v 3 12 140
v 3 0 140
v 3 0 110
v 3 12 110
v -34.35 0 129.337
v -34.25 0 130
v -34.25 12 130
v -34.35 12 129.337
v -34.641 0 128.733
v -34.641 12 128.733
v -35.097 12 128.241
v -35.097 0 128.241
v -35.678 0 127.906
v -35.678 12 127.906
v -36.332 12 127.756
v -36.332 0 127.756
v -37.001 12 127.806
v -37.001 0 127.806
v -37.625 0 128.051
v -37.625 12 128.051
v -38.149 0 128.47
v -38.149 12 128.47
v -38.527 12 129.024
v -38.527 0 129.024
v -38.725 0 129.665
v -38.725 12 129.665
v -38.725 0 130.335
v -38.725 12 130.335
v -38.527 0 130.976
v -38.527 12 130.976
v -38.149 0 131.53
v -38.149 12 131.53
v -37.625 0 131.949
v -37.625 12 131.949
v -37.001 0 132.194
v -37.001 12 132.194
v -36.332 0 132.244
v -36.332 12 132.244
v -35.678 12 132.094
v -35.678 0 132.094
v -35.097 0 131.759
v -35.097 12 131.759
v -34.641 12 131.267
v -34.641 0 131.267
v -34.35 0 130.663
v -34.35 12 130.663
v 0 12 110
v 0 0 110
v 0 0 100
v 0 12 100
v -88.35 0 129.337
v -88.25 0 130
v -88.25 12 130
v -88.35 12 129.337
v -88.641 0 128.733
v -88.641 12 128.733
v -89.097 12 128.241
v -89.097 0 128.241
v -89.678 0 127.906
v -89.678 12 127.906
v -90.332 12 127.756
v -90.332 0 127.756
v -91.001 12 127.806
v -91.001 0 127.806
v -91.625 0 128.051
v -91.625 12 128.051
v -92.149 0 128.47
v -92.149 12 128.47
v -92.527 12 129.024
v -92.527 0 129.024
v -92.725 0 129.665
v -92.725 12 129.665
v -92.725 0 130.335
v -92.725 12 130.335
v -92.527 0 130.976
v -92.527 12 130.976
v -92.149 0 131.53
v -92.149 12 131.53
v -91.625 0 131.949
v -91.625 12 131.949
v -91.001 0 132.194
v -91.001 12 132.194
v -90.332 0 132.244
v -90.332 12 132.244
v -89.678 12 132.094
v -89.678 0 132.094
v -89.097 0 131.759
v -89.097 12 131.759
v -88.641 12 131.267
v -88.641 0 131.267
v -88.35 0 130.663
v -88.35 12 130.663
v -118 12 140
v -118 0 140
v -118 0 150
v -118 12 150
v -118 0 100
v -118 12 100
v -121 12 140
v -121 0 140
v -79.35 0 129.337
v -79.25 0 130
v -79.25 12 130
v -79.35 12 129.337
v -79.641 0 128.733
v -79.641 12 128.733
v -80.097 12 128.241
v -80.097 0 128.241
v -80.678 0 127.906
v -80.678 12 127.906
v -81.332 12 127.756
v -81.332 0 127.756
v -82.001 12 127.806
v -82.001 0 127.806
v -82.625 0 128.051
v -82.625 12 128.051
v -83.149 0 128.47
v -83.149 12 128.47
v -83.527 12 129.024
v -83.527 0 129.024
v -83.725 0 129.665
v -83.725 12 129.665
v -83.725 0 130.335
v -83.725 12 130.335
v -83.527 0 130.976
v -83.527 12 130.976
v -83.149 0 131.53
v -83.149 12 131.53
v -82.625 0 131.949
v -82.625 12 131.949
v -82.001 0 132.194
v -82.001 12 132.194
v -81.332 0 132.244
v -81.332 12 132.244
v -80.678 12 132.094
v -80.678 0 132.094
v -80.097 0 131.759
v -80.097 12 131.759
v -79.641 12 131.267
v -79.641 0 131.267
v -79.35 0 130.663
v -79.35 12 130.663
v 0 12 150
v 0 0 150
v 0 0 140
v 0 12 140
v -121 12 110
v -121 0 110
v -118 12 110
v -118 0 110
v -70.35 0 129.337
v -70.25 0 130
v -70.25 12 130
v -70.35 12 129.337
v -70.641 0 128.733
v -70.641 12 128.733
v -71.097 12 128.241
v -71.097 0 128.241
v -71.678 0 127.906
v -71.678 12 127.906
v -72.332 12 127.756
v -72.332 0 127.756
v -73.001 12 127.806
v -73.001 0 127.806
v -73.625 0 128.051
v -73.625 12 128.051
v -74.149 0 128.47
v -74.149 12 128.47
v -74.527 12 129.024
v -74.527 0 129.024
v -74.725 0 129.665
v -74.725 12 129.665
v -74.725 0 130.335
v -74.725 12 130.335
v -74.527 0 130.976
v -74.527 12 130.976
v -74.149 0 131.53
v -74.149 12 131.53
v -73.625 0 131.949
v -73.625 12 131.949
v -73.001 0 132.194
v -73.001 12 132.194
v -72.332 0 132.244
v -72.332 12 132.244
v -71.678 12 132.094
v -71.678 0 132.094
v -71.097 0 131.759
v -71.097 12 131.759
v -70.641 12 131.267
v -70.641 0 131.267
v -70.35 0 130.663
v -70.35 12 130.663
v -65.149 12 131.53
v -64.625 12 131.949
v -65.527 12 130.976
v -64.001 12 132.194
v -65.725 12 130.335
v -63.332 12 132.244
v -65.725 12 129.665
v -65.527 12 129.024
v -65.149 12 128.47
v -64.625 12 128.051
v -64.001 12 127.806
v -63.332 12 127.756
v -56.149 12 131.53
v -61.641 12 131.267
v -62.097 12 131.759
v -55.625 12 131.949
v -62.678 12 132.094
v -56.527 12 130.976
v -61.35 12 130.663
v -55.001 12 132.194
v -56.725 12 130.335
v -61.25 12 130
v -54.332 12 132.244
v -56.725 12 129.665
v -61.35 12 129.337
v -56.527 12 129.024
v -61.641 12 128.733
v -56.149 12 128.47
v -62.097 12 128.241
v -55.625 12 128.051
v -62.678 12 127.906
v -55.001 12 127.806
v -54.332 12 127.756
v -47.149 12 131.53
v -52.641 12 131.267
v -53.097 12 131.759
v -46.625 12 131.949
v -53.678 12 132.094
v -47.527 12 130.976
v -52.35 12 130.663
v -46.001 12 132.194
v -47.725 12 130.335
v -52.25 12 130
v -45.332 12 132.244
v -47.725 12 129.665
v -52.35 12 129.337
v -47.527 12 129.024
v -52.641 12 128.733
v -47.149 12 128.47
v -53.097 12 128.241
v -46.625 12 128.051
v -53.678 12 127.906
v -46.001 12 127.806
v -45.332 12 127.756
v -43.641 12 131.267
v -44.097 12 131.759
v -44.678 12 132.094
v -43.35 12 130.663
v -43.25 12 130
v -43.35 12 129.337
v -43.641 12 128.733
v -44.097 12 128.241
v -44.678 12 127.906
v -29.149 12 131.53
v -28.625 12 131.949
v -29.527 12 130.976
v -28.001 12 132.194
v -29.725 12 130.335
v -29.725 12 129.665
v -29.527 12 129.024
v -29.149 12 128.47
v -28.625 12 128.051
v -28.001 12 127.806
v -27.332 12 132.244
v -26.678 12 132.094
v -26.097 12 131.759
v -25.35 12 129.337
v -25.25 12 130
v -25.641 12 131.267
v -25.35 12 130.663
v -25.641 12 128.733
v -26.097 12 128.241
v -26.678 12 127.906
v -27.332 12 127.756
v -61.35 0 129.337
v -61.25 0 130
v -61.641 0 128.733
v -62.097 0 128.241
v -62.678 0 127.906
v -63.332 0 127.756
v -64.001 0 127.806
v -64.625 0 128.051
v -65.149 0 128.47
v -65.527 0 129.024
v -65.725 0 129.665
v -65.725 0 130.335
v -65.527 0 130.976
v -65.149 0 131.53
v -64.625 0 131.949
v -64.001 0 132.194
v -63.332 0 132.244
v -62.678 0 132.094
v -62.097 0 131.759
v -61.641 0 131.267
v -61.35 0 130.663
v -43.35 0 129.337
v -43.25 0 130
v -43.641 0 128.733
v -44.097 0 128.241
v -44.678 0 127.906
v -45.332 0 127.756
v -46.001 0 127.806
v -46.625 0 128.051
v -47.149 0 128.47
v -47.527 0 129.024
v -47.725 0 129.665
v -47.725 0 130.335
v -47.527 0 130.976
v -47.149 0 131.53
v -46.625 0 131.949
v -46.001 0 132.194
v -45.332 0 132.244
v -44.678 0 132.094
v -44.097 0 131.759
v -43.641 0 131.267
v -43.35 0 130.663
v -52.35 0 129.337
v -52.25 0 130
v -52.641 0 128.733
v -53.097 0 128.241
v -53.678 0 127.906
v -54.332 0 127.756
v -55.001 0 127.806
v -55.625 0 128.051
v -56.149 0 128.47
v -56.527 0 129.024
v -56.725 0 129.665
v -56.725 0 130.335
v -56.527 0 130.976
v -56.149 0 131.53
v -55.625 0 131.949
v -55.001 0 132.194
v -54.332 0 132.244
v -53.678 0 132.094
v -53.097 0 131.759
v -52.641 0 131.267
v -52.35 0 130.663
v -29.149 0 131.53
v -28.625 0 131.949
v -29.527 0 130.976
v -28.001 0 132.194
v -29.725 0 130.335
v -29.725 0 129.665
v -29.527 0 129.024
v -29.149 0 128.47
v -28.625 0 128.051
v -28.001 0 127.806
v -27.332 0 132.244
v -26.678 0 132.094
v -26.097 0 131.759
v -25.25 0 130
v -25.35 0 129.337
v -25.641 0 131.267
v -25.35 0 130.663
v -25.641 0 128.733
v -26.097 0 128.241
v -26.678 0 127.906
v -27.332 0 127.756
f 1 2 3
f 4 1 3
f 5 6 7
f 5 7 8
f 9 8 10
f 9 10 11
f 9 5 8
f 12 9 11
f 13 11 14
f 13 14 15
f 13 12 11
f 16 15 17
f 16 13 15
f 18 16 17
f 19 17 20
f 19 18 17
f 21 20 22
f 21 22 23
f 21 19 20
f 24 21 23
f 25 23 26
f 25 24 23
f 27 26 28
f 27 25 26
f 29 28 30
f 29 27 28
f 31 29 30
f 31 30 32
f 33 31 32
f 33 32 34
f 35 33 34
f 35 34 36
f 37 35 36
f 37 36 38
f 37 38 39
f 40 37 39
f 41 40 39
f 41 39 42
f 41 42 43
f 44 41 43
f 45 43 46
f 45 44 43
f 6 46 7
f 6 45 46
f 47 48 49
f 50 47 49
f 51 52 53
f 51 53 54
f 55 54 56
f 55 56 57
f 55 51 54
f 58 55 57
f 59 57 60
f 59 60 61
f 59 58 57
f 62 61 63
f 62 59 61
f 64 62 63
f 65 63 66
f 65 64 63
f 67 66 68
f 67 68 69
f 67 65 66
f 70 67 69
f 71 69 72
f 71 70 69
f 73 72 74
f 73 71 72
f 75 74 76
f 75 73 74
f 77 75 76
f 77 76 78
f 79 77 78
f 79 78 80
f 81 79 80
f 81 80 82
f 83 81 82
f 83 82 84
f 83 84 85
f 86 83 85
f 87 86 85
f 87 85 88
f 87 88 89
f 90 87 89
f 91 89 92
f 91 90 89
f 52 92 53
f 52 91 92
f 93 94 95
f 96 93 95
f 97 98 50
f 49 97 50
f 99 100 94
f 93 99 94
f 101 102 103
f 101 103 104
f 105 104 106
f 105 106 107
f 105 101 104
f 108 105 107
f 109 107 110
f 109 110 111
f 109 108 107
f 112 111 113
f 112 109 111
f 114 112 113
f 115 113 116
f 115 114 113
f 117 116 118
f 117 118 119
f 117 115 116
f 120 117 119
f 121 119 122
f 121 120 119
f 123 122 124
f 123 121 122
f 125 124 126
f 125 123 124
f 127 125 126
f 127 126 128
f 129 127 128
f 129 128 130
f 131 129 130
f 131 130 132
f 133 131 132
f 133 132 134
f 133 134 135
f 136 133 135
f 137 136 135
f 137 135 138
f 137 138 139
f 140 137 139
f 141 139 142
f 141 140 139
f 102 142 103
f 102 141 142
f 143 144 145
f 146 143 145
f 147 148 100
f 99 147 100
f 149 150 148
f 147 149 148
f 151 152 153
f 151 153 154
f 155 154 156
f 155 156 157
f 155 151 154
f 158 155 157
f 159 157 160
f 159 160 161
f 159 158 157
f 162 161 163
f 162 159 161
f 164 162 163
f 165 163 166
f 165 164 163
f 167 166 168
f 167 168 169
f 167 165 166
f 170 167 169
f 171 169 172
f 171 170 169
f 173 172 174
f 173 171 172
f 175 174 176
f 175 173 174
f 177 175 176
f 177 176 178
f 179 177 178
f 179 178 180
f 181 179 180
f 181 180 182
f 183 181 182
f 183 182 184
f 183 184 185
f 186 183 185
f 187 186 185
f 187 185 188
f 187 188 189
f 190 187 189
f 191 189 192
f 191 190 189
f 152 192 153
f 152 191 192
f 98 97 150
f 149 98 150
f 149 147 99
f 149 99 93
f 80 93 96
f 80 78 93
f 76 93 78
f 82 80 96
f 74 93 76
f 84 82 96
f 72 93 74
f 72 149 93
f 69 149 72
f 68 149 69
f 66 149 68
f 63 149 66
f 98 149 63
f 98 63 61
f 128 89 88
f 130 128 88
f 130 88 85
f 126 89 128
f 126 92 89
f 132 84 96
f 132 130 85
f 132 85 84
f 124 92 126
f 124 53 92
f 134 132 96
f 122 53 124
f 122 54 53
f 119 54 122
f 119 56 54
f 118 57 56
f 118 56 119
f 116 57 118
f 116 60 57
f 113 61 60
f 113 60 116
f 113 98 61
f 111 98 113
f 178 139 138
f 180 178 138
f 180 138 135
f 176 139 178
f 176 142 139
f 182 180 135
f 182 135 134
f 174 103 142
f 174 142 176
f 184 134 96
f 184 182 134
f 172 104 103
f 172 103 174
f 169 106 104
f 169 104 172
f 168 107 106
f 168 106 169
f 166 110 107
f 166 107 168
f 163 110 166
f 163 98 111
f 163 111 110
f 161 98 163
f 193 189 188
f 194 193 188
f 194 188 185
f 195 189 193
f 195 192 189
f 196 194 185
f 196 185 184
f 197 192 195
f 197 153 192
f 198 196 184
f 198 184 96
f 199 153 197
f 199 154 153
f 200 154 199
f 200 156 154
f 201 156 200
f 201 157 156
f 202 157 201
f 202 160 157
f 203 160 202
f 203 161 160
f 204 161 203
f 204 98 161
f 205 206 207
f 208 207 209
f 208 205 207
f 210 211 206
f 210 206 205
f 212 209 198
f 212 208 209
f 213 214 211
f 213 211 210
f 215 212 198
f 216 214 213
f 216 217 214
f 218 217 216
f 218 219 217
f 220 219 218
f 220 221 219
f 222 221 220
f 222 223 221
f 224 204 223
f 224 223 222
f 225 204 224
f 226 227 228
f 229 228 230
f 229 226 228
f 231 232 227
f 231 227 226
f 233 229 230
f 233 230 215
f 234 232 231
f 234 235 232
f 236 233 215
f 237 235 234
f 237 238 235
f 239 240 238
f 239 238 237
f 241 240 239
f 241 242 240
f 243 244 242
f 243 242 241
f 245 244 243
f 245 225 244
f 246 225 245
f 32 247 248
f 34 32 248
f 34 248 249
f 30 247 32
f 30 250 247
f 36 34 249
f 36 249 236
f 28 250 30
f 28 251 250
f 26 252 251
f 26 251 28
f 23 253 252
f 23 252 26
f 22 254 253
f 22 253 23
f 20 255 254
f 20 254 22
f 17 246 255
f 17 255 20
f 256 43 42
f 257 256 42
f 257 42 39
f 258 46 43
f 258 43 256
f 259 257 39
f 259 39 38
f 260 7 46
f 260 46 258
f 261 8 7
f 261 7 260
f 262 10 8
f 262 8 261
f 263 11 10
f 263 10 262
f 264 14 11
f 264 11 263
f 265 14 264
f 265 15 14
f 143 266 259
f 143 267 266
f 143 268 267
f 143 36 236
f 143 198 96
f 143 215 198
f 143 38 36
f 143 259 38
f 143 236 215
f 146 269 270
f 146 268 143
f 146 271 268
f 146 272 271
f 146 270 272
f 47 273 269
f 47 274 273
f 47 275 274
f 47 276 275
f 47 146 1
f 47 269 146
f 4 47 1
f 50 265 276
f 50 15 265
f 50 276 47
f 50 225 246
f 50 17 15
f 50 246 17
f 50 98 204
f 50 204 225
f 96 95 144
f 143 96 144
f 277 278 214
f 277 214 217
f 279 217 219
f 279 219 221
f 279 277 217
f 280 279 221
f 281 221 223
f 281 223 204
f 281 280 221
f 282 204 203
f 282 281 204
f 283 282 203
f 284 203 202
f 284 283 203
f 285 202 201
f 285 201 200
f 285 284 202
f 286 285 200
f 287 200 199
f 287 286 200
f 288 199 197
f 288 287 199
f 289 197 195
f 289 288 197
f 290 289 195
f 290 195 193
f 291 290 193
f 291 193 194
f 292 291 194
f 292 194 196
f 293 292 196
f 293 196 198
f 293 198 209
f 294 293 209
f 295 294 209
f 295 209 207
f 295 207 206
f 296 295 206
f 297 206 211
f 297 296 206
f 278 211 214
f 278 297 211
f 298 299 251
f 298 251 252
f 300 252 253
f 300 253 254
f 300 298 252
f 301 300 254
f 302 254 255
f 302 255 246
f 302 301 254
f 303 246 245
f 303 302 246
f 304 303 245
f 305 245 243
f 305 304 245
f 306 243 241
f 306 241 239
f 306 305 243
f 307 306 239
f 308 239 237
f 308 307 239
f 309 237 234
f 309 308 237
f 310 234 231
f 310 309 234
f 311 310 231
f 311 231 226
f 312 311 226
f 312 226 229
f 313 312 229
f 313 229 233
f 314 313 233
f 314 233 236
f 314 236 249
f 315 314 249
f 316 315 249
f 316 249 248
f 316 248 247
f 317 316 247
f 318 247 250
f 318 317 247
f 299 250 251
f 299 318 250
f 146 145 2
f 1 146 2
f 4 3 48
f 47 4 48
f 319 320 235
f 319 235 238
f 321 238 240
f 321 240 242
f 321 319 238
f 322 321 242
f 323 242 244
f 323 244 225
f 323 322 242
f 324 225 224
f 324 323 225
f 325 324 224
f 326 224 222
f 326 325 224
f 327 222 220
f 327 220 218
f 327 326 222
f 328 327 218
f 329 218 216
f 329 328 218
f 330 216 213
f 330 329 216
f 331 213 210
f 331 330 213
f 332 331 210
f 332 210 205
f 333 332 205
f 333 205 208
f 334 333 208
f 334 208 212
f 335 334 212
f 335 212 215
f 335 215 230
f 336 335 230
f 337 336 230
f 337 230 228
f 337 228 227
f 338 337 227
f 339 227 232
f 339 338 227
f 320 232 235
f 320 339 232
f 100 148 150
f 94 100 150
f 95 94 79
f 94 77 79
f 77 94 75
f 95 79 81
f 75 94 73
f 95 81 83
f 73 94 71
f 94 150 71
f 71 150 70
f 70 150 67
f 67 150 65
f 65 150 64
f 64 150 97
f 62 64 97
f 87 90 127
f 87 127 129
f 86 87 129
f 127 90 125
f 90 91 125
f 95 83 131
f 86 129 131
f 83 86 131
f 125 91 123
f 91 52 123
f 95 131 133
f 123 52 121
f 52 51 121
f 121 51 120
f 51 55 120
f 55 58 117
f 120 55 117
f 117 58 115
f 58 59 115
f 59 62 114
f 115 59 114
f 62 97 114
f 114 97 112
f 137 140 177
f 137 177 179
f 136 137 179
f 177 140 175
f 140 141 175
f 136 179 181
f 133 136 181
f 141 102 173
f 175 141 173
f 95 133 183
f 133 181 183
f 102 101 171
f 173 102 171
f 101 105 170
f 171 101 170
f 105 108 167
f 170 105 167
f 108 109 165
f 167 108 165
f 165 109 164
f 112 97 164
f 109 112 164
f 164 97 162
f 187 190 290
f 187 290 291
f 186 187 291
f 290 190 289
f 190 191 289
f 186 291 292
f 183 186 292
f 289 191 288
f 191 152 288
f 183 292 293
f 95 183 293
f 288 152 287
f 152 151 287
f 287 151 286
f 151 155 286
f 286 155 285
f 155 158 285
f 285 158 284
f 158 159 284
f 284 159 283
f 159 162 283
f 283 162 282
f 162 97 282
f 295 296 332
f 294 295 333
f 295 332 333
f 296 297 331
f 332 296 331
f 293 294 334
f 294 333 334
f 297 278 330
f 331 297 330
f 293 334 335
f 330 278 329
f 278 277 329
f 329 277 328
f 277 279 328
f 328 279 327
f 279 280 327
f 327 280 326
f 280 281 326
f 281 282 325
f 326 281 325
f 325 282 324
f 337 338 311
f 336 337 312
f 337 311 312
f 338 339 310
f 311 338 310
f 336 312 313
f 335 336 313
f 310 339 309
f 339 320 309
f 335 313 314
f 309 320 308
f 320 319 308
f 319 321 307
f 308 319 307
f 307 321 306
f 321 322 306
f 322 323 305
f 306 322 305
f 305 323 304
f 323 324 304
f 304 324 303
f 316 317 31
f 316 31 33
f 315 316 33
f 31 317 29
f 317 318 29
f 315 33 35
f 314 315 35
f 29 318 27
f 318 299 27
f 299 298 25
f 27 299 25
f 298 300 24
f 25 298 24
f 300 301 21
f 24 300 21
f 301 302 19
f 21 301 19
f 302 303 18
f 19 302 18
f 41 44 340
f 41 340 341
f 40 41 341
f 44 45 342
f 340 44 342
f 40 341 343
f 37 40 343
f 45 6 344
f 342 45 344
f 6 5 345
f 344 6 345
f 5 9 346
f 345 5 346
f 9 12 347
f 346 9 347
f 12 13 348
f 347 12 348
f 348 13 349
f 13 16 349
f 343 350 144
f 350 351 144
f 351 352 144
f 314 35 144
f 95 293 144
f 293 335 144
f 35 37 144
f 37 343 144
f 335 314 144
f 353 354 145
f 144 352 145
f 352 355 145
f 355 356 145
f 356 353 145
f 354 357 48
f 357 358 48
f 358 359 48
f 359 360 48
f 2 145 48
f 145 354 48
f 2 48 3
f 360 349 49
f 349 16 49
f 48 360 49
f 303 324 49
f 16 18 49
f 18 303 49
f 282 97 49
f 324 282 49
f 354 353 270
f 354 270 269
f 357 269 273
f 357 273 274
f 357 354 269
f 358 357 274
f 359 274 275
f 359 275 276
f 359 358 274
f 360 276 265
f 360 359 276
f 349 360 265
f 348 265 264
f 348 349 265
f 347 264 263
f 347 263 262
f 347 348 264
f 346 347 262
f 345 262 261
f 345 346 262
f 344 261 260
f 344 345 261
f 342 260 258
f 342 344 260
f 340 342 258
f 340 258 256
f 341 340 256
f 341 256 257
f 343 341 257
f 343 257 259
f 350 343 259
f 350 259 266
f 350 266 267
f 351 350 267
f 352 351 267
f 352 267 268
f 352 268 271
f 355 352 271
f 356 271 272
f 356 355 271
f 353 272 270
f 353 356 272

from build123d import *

# Parameters (mm, degrees)
IMPORTED_BODY_2_1_OUTLINE_R = 2.25
IMPORTED_BODY_2_1_DEPTH     = 12
SKETCH_2_W                  = 124
SKETCH_2_H                  = 100
CUT_EXTRUDE_1_DEPTH         = 12


# Read off the part's stored shape, not the designer's step: 基体零件-零件2-1
with BuildPart() as part:
    # 基体零件-零件2-1 outline → 基体零件-零件2-1 (new body)
    with BuildSketch(Plane(origin=(0, 0, 0), x_dir=(1, 0, 0), z_dir=(0, 1, 0))):
        Polygon((0, -150), (0, -140), (3, -140), (3, -110), (0, -110), (0, -90), (3, -90), (3, -60), (0, -60), (0, -40), (3, -40), (3, -10), (0, -10), (0, 0), (-118, 0), (-118, -10), (-121, -10), (-121, -40), (-118, -40), (-118, -60), (-121, -60), (-121, -90), (-118, -90), (-118, -110), (-121, -110), (-121, -140), (-118, -140), (-118, -150), align=None)
        with Locations((-90.5, -130)):
            Circle(IMPORTED_BODY_2_1_OUTLINE_R, mode=Mode.SUBTRACT)
        with Locations((-81.5, -130)):
            Circle(IMPORTED_BODY_2_1_OUTLINE_R, mode=Mode.SUBTRACT)
        with Locations((-72.5, -130)):
            Circle(IMPORTED_BODY_2_1_OUTLINE_R, mode=Mode.SUBTRACT)
        with Locations((-63.5, -130)):
            Circle(IMPORTED_BODY_2_1_OUTLINE_R, mode=Mode.SUBTRACT)
        with Locations((-54.5, -130)):
            Circle(IMPORTED_BODY_2_1_OUTLINE_R, mode=Mode.SUBTRACT)
        with Locations((-45.5, -130)):
            Circle(IMPORTED_BODY_2_1_OUTLINE_R, mode=Mode.SUBTRACT)
        with Locations((-36.5, -130)):
            Circle(IMPORTED_BODY_2_1_OUTLINE_R, mode=Mode.SUBTRACT)
        with Locations((-27.5, -130)):
            Circle(IMPORTED_BODY_2_1_OUTLINE_R, mode=Mode.SUBTRACT)
    extrude(amount=IMPORTED_BODY_2_1_DEPTH)

    # 草图2 → 切除-拉伸1 (cut)
    with BuildSketch(Plane(origin=(0, 12, 0), x_dir=(1, 0, 0), z_dir=(0, 1, 0))):
        with Locations((-59, -50)):
            Rectangle(SKETCH_2_W, SKETCH_2_H)
    extrude(amount=-CUT_EXTRUDE_1_DEPTH, mode=Mode.SUBTRACT)


solid = part.part
